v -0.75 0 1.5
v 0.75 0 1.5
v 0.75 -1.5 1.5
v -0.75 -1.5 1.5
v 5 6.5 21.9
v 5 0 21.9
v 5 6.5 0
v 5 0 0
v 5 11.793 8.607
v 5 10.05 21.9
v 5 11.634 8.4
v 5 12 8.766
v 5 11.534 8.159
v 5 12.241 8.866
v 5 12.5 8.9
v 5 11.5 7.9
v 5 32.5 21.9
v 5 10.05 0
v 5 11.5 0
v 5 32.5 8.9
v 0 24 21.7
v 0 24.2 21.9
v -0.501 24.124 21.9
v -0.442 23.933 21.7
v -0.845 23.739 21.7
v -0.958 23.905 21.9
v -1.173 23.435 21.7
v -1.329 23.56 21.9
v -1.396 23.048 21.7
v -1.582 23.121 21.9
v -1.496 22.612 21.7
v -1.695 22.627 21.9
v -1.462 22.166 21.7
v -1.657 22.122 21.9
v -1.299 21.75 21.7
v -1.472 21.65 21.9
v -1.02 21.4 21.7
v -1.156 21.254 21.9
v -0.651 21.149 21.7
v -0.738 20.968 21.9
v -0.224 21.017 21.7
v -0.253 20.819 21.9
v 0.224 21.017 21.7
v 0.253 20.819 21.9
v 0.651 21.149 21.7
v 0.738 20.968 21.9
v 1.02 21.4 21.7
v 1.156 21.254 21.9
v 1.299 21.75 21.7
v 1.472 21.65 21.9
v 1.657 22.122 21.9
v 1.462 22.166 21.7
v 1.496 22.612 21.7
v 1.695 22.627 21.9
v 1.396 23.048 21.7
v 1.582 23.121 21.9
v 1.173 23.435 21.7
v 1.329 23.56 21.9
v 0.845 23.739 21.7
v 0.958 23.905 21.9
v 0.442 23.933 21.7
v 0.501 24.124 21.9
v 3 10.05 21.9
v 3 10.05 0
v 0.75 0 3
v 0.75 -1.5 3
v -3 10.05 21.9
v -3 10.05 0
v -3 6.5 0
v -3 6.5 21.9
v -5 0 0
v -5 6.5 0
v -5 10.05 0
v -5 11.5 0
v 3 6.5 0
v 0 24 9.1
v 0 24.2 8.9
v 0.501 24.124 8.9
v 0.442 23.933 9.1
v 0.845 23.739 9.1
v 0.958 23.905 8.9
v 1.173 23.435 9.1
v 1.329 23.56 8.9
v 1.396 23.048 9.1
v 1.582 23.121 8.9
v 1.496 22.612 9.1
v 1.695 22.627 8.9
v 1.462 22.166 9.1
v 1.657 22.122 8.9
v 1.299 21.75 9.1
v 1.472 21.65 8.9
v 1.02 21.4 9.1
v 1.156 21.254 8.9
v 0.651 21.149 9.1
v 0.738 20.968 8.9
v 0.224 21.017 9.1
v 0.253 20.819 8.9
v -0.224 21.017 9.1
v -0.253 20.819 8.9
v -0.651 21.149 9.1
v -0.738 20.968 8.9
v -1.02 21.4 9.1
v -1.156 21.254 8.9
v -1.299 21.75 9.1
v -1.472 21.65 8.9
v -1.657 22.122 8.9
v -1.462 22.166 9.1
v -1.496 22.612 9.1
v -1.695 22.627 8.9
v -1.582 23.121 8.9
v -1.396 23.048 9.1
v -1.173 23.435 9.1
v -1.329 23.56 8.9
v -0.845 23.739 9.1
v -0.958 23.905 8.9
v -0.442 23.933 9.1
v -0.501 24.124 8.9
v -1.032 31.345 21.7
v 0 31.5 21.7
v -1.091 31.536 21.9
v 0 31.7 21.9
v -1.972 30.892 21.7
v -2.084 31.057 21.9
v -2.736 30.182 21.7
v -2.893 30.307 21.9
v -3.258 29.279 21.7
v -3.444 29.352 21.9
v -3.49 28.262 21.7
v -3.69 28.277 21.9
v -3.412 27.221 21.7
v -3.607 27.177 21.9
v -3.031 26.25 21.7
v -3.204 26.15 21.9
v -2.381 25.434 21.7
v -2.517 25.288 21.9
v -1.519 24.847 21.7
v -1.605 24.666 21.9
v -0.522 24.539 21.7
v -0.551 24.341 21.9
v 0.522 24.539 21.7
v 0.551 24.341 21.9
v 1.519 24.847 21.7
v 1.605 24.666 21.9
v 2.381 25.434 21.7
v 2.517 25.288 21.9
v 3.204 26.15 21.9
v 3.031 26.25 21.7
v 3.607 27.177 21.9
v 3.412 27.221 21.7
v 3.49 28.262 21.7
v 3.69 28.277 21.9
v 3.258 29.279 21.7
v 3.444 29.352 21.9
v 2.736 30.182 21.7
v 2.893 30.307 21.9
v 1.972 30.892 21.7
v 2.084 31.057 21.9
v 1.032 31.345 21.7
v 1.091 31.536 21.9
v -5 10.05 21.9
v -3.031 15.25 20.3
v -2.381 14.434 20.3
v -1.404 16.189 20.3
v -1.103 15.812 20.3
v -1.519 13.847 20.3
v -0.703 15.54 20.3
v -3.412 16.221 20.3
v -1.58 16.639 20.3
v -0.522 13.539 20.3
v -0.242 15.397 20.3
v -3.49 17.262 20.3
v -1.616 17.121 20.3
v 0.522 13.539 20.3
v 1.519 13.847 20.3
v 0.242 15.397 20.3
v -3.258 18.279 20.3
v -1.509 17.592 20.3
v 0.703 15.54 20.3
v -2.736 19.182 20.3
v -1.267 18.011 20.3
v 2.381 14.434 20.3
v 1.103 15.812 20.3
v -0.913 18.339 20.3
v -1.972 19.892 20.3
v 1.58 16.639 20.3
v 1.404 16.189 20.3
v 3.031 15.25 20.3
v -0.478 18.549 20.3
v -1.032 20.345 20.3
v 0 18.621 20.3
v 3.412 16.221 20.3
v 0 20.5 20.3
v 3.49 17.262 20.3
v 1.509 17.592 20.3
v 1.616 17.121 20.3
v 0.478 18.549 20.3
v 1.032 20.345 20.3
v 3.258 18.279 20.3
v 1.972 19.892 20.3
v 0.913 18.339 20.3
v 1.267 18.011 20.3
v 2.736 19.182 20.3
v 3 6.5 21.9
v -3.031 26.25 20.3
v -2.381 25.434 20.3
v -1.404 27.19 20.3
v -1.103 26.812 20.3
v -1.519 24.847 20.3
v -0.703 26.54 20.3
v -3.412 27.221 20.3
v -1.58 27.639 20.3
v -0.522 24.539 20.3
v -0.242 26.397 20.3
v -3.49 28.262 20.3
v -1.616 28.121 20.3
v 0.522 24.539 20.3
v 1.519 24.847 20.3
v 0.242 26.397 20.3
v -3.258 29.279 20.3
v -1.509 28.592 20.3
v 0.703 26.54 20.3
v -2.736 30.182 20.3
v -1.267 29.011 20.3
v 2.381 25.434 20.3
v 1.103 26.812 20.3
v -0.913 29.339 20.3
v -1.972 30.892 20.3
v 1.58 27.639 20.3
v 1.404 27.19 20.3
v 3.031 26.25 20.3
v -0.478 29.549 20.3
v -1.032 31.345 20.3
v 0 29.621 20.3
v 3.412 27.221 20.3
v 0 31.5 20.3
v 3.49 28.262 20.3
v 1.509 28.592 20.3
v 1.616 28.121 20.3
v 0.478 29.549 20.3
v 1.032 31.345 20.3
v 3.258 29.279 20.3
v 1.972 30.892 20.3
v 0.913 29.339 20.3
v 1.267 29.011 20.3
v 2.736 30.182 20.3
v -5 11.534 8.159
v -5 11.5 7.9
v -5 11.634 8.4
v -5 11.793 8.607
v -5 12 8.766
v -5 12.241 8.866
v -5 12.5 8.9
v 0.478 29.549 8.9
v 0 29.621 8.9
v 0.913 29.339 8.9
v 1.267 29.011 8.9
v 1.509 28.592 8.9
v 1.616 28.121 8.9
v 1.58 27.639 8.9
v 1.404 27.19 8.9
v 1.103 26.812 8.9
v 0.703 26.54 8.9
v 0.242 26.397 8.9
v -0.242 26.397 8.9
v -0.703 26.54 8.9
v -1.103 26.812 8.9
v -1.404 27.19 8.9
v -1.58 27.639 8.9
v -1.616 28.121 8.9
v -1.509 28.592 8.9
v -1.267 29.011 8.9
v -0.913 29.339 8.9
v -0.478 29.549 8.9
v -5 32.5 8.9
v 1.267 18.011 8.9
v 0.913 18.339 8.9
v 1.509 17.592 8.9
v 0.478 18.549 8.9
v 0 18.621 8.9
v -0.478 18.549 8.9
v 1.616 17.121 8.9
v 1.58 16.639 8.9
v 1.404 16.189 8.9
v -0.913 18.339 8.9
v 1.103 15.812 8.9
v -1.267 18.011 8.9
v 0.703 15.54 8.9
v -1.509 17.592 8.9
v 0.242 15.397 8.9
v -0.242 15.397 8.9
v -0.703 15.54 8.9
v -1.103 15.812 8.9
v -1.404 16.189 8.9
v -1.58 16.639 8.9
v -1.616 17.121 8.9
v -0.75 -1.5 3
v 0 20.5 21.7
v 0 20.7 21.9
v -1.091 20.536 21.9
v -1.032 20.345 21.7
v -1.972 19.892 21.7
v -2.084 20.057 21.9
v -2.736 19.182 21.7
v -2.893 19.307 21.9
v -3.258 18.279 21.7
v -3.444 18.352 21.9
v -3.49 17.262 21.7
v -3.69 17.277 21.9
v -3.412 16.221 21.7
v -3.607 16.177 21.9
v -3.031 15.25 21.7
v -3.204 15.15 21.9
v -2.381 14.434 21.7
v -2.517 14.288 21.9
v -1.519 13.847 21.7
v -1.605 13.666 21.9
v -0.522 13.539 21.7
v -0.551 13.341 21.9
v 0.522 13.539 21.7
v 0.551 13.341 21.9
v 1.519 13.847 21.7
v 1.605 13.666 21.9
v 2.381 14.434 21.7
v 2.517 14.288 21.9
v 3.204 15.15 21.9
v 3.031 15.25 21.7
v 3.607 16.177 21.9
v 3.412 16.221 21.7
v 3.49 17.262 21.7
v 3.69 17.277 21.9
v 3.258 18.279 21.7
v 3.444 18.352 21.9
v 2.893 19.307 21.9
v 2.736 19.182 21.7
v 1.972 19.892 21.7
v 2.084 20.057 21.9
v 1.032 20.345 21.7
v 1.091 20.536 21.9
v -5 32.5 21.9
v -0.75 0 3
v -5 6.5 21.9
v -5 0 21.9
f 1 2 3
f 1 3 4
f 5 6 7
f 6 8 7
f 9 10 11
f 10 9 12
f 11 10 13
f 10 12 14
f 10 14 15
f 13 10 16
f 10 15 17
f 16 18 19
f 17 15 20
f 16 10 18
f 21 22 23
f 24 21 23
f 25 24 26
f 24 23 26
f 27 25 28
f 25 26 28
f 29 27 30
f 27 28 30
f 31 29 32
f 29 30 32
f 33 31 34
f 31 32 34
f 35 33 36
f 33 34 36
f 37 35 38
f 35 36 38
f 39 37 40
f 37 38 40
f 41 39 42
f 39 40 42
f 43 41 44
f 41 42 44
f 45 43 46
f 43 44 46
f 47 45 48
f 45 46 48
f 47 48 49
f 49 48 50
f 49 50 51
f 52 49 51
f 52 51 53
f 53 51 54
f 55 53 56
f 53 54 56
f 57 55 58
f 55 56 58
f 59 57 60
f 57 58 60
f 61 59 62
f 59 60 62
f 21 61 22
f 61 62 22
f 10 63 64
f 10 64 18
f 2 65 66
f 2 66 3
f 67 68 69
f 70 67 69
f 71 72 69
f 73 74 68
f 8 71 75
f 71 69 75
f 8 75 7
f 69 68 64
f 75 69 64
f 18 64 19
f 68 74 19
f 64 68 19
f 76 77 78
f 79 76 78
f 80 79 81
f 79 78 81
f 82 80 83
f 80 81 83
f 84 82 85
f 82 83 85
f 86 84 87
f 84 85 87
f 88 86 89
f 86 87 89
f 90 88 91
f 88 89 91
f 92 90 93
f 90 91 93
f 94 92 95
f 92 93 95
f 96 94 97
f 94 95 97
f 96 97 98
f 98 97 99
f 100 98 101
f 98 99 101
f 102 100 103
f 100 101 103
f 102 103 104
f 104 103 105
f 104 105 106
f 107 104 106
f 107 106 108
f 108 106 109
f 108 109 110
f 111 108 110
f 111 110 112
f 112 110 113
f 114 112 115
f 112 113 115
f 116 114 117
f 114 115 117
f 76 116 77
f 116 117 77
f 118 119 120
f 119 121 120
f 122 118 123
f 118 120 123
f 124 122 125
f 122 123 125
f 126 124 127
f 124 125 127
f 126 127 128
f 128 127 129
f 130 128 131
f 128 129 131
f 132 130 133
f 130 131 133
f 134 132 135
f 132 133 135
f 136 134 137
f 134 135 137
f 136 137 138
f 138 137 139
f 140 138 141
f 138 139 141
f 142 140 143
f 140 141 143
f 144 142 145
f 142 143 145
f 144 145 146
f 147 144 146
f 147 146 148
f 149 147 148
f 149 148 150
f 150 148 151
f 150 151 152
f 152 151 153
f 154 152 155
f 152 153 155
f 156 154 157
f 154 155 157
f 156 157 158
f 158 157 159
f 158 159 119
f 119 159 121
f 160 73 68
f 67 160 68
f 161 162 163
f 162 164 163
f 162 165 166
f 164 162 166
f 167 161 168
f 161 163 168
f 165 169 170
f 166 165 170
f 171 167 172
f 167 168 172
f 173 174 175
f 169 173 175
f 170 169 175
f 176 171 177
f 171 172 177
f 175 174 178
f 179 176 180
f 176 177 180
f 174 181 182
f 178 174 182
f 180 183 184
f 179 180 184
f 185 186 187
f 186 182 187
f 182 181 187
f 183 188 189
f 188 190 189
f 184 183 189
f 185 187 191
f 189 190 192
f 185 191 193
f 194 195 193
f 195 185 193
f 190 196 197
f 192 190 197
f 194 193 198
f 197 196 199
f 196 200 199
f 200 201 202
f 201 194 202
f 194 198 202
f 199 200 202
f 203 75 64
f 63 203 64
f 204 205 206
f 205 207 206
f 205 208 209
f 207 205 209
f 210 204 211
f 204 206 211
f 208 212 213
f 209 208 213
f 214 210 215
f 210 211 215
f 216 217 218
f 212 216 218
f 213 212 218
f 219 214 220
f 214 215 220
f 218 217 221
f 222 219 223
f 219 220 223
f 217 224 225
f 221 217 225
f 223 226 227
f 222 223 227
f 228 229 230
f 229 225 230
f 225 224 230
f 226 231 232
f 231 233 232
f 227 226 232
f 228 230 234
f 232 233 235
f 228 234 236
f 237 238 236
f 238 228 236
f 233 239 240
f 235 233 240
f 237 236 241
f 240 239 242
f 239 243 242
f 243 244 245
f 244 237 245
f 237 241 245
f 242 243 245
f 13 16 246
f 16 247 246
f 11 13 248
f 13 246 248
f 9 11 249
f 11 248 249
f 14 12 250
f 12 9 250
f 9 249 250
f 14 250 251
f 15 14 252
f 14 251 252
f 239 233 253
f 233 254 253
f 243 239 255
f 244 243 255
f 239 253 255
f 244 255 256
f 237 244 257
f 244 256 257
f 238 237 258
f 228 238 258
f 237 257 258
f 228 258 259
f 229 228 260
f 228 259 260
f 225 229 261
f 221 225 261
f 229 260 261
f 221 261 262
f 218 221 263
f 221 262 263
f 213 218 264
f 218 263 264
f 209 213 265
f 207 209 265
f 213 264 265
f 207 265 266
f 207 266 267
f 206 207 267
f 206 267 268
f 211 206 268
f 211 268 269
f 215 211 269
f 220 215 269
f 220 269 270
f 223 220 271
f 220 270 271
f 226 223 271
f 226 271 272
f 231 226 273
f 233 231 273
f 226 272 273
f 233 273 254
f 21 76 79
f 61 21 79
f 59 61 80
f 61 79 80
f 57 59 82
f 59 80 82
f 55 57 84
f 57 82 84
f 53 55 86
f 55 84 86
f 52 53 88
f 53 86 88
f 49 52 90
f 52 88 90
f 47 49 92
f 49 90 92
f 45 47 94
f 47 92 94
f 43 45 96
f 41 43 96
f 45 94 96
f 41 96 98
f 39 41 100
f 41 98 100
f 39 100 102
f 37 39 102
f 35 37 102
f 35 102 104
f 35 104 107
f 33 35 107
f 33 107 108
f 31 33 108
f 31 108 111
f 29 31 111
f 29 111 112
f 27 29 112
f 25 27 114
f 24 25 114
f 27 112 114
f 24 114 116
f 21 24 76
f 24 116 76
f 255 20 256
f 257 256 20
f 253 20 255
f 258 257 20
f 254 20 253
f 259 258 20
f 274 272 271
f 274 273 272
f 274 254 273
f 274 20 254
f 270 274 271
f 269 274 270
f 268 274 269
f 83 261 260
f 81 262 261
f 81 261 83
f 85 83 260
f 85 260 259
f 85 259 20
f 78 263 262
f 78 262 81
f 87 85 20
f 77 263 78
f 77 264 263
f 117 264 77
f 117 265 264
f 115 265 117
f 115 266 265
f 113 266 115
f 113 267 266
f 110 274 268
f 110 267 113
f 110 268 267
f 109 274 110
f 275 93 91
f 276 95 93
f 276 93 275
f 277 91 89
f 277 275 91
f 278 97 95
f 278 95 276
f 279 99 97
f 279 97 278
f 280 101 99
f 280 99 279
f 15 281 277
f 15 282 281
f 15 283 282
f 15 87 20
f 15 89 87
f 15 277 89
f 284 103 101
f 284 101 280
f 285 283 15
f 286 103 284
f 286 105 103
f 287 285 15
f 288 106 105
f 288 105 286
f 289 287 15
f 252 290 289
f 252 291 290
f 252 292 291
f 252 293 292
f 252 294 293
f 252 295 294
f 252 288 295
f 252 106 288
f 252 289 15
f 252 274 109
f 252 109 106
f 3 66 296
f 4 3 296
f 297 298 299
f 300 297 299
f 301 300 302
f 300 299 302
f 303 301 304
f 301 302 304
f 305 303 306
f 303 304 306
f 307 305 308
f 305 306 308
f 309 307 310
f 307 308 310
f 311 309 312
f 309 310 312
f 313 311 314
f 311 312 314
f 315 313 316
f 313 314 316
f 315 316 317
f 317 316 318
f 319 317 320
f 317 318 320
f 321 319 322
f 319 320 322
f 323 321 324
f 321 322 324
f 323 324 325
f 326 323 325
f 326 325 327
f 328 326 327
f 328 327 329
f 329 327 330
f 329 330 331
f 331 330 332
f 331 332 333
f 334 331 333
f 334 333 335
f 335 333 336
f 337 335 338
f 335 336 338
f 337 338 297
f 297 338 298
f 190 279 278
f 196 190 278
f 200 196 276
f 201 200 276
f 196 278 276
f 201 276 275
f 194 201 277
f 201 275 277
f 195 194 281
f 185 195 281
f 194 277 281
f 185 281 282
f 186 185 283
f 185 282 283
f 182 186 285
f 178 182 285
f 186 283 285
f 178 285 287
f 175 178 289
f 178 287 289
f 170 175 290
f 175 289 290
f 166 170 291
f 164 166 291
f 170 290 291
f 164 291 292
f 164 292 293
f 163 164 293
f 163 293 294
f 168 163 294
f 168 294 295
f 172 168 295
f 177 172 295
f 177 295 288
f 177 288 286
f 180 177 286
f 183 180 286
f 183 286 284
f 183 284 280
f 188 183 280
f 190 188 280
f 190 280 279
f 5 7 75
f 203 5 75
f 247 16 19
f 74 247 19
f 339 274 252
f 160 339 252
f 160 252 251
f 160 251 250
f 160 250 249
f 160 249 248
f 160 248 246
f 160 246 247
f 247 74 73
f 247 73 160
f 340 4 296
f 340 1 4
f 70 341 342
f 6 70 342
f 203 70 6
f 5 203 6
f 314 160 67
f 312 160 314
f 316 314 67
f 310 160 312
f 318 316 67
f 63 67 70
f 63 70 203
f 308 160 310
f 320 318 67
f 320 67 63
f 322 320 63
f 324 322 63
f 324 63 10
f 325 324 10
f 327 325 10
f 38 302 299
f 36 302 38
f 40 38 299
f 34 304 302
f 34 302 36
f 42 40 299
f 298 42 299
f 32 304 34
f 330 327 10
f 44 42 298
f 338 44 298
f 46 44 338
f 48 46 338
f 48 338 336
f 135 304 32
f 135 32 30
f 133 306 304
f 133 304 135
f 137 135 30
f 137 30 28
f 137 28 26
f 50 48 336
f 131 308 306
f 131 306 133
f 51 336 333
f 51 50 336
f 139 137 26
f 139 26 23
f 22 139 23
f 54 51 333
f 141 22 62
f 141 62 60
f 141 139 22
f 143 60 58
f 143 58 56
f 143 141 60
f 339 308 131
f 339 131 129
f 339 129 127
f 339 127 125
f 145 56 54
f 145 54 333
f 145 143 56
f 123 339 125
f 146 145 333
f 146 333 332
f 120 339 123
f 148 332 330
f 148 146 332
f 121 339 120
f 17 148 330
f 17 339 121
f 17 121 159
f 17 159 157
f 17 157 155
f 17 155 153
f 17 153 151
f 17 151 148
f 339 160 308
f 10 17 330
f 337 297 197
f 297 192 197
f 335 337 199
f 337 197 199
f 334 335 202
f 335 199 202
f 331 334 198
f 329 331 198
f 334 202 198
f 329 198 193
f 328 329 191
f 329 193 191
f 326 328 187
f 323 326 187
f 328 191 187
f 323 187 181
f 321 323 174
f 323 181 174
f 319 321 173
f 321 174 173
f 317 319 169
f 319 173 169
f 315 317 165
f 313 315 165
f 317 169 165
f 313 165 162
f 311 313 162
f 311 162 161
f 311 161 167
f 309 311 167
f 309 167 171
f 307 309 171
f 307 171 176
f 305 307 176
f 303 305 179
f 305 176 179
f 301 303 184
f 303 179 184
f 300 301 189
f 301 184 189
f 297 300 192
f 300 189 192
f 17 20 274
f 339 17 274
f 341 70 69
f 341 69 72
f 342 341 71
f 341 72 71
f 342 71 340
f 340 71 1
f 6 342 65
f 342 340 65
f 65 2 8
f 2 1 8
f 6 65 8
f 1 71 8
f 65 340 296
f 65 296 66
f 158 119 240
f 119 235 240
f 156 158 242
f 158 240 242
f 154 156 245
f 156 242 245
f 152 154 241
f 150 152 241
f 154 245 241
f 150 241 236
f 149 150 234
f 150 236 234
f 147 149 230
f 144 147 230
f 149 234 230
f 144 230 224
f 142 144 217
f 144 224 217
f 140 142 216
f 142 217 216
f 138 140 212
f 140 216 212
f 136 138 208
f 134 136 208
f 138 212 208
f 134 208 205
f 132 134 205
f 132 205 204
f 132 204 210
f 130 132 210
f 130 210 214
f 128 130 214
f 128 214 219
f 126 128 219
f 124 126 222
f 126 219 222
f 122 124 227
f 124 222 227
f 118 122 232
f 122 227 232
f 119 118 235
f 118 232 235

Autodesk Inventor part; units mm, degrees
sketch "Sketch_1" plane through (0, 0, 0) normal (0, 0, 1) x (1, 0, 0)
  line L0 (-5, 10.05) -> (-3, 10.05)
  line L1 (-3, 10.05) -> (-3, 6.5)
  line L2 (-3, 6.5) -> (-5, 6.5)
  line L3 (-5, 6.5) -> (-5, 0)
  line L4 (-5, 0) -> (5, 0)
  line L5 (5, 0) -> (5, 6.5)
  line L6 (5, 6.5) -> (3, 6.5)
  line L7 (3, 6.5) -> (3, 10.05)
  line L8 (3, 10.05) -> (5, 10.05)
  line L9 (5, 10.05) -> (5, 32.5)
  line L10 (5, 32.5) -> (-5, 32.5)
  line L11 (-5, 32.5) -> (-5, 10.05)
extrude "Extrusion1" add sketch "Sketch_1" along normal blind 21.9
sketch "Sketch_2" plane through (0, 0, 0) normal (1, 0, 0) x (0, 1, 0)
  arc A0 (12.5, 8.9) -> (11.5, 7.9) centre (12.5, 7.9) ccw
  line L0 (11.5, 7.9) -> (11.5, 0)
  line L1 (11.5, 0) -> (32.5, 0)
  line L2 (32.5, 0) -> (32.5, 8.9)
  line L3 (32.5, 8.9) -> (12.5, 8.9)
extrude "Extrusion2" cut sketch "Sketch_2" along normal mid plane 10
sketch "Sketch_5" plane through (0, 0, 0) normal (1, 0, 0) x (0, 1, 0)
  line L0 (22.5, 8.9) -> (22.5, 21.9)
  line L1 (22.5, 21.9) -> (24.2, 21.9)
  line L2 (24.2, 21.9) -> (24, 21.7)
  line L3 (24, 21.7) -> (24, 9.1)
  line L4 (24, 9.1) -> (24.2, 8.9)
  line L5 (24.2, 8.9) -> (22.5, 8.9)
  line L6 (22.5, 8.9) -> (22.5, 21.9)
revolve "Revolution1" cut sketch "Sketch_5" angle 360 about axis through (0, 22.5, 8.9) along (0, 0, -1)
sketch "Sketch_6" plane through (0, 0, 0) normal (1, 0, 0) x (0, 1, 0)
  line L0 (17, 8.9) -> (17, 21.9)
  line L1 (17, 21.9) -> (20.7, 21.9)
  line L2 (20.7, 21.9) -> (20.5, 21.7)
  line L3 (20.5, 21.7) -> (20.5, 20.3)
  line L4 (20.5, 20.3) -> (18.621, 20.3)
  line L5 (18.621, 20.3) -> (18.621, 8.9)
  line L6 (18.621, 8.9) -> (17, 8.9)
  line L7 (17, 8.9) -> (17, 21.9)
revolve "Revolution2" cut sketch "Sketch_6" angle 360 about axis through (0, 17, 8.9) along (0, 0, -1)
thread "Thread1" size "M4x0.7" class "6H" standard "ISO Metric profile" full length
sketch "Sketch_7" plane through (0, 0, 0) normal (1, 0, 0) x (0, 1, 0)
  line L0 (28, 8.9) -> (28, 21.9)
  line L1 (28, 21.9) -> (31.7, 21.9)
  line L2 (31.7, 21.9) -> (31.5, 21.7)
  line L3 (31.5, 21.7) -> (31.5, 20.3)
  line L4 (31.5, 20.3) -> (29.621, 20.3)
  line L5 (29.621, 20.3) -> (29.621, 8.9)
  line L6 (29.621, 8.9) -> (28, 8.9)
  line L7 (28, 8.9) -> (28, 21.9)
revolve "Revolution3" cut sketch "Sketch_7" angle 360 about axis through (0, 28, 8.9) along (0, 0, -1)
thread "Thread2" size "M4x0.7" class "6H" standard "ISO Metric profile" full length
sketch "Sketch_10" plane through (0, 0, 0) normal (0, 1, 0) x (-1, 0, 0)
  line L0 (0.75, 3) -> (-0.75, 3)
  line L1 (-0.75, 3) -> (-0.75, 1.5)
  line L2 (-0.75, 1.5) -> (0.75, 1.5)
  line L3 (0.75, 1.5) -> (0.75, 3)
extrude "Extrusion3" add sketch "Sketch_10" against normal blind 1.5
ref_plane "GRIFF_XY" through (0, 0, 0) normal (0, 0, -1) x (1, 0, 0)
ref_plane "GRIFF_YZ" through (0, 0, 0) normal (1, 0, 0) x (0, -1, 0)
ref_plane "GRIFF_ZX" through (0, 0, 0) normal (0, -1, 0) x (0, 0, -1)
ref_plane "TO_ZBH_1_XY" through (0, 17, 20.3) normal (0, 0, -1) x (1, 0, 0)
ref_plane "TO_ZBH_1_YZ" through (0, 17, 20.3) normal (1, 0, 0) x (0, -1, 0)
ref_plane "TO_ZBH_1_ZX" through (0, 17, 20.3) normal (0, -1, 0) x (0, 0, -1)
ref_plane "TO_ZBH_2_XY" through (0, 28, 20.3) normal (0, 0, -1) x (1, 0, 0)
ref_plane "TO_ZBH_2_YZ" through (0, 28, 20.3) normal (1, 0, 0) x (0, -1, 0)
ref_plane "TO_ZBH_2_ZX" through (0, 28, 20.3) normal (0, -1, 0) x (0, 0, -1)
properties part number "1254044 DHPS-16-A-NO---(Handle)"
